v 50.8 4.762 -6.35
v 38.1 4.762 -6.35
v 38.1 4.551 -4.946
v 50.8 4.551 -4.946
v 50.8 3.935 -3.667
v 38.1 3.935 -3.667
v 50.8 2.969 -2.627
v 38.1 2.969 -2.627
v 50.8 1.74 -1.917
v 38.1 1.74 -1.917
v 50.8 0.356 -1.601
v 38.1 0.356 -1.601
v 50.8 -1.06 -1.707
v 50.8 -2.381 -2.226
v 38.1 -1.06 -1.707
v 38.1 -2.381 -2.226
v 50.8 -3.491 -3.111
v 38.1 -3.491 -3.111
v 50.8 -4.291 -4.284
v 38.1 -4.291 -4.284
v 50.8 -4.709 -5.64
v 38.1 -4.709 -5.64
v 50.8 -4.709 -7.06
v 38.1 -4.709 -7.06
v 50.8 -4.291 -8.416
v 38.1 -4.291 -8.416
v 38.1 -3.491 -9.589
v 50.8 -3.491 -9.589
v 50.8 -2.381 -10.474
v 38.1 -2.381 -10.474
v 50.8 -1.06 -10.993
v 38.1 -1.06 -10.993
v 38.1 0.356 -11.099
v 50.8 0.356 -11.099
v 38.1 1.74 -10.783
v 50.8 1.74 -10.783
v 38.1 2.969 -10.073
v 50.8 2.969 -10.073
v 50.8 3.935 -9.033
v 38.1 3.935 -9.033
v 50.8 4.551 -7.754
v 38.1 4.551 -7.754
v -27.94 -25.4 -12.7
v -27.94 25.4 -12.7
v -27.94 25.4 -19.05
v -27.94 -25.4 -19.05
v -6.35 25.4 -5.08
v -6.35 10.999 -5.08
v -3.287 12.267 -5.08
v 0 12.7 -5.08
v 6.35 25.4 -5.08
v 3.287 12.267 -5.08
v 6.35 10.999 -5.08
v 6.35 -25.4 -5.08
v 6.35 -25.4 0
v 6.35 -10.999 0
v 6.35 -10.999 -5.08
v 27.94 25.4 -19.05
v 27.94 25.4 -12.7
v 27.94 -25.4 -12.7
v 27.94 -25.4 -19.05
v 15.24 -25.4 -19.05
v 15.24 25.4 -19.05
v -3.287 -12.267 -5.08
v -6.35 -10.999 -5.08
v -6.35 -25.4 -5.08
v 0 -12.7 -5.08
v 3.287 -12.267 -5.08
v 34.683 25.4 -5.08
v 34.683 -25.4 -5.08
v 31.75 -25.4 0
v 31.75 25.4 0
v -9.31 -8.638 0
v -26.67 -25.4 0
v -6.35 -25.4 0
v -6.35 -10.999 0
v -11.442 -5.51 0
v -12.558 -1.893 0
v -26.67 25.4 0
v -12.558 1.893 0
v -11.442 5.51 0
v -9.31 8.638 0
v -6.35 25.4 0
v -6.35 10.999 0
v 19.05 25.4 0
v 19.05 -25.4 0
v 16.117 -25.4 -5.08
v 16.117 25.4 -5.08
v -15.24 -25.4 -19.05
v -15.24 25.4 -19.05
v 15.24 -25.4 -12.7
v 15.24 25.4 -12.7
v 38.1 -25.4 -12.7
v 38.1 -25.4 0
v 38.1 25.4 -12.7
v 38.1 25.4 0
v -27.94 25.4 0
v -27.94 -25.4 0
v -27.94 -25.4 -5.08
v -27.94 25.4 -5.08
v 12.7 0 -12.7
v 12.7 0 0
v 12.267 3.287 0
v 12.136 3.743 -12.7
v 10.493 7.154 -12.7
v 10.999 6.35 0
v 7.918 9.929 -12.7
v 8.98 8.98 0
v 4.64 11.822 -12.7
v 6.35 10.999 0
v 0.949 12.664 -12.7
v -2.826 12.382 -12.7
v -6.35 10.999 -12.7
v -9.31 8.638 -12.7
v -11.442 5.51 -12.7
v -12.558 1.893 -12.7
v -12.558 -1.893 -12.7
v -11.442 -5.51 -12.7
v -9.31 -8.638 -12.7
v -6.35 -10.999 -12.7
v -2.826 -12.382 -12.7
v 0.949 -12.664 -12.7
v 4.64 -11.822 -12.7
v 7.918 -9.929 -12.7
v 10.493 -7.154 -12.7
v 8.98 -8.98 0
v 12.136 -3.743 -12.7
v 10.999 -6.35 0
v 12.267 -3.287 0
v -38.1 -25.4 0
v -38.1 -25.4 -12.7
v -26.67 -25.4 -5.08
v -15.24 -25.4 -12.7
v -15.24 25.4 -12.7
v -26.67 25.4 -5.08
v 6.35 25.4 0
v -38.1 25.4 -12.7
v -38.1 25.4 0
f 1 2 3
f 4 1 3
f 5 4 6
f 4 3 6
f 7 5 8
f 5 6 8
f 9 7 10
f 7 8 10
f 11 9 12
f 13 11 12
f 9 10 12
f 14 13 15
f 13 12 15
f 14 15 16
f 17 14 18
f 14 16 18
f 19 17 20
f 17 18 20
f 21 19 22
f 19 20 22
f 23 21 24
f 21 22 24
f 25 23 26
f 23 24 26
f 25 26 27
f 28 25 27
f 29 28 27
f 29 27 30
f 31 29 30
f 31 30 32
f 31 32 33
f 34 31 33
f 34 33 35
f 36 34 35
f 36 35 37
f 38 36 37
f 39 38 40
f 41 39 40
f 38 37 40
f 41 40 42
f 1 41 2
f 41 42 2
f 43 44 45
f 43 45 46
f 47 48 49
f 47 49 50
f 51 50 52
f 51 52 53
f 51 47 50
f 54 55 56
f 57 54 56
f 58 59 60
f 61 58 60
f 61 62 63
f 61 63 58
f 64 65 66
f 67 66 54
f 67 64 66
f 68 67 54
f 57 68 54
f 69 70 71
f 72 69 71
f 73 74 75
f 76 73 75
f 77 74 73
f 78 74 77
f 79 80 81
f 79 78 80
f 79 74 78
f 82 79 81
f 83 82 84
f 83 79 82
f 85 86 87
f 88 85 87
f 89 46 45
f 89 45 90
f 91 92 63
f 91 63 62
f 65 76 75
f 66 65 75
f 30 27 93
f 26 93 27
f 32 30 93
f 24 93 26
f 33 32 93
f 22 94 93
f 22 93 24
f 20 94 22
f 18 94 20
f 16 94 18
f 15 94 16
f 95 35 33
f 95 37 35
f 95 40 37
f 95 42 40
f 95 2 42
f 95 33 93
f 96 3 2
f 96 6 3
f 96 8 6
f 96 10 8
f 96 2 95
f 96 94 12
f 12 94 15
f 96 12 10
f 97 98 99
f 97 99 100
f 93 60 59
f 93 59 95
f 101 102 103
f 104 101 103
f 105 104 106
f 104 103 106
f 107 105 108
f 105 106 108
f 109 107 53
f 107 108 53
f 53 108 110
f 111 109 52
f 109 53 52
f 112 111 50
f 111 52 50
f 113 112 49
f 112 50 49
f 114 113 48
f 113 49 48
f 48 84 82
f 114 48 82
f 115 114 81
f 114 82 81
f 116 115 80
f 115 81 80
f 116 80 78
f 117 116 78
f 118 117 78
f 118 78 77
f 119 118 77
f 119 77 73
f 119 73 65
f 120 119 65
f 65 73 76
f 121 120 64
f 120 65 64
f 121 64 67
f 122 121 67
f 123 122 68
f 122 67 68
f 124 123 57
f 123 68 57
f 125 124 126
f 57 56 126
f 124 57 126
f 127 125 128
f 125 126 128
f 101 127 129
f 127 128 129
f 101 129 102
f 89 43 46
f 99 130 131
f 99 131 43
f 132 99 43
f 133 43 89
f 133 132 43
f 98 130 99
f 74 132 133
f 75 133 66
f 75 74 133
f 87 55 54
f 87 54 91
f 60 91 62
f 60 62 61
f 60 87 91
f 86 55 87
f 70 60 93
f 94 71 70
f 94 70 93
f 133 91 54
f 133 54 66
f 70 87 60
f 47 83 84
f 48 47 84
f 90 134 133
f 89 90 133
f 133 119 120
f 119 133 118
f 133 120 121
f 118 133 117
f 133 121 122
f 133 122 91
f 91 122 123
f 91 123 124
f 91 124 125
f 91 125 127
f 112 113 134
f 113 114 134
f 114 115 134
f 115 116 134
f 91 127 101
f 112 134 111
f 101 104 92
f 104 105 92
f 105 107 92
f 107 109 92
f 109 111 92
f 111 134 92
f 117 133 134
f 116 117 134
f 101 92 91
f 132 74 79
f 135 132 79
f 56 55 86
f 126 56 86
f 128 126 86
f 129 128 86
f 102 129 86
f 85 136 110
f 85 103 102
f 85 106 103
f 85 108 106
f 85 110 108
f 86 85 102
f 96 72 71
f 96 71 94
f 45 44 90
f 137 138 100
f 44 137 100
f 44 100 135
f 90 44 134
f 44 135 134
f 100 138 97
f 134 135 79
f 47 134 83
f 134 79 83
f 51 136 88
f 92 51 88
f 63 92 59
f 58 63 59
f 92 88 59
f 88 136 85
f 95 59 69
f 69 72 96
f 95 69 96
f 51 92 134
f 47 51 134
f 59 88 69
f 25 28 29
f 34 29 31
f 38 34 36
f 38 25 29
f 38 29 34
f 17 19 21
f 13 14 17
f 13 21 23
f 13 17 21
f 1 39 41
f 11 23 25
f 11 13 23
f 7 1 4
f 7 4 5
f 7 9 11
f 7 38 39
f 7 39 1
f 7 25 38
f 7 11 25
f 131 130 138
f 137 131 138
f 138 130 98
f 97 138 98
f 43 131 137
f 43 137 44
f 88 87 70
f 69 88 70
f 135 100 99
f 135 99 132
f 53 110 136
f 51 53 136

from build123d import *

# Parameters (mm, degrees)
F0_W     = 76.2
F0_H     = 50.8
F0_R     = 12.7
F1_DEPTH = 12.7
F2_W     = 1.27
F2_H     = 50.8
F3_DEPTH = 5.08
F5_DEPTH = 50.801
F6_R     = 4.7625
F7_DEPTH = 12.7
F8_W     = 12.7
F8_H     = 50.8
F9_DEPTH = 6.35


with BuildPart() as f1:
    # F0 (on Top) → F1 (new body)
    with BuildSketch(Plane.XY):
        Rectangle(F0_W, F0_H)
        Circle(F0_R, mode=Mode.SUBTRACT)
    extrude(amount=-F1_DEPTH)

    # F2 (on face) → F3 (cut)
    with BuildSketch(Plane.XY):
        with Locations((-27.305, 0)):
            Rectangle(F2_W, F2_H)
        with BuildLine():
            Line((-6.35, -10.9985226281), (-6.35, -25.4))
            Line((-6.35, -25.4), (6.35, -25.4))
            Line((6.35, -25.4), (6.35, -10.9985226281))
            ThreePointArc((6.35, -10.9985226281), (0, -12.7), (-6.35, -10.9985226281))
        make_face()
        with BuildLine():
            Line((6.35, 25.4), (-6.35, 25.4))
            Line((-6.35, 25.4), (-6.35, 10.9985226281))
            ThreePointArc((-6.35, 10.9985226281), (0, 12.7), (6.35, 10.9985226281))
            Line((6.35, 10.9985226281), (6.35, 25.4))
        make_face()
    extrude(amount=-F3_DEPTH, mode=Mode.SUBTRACT)

    # F4 (on face) → F5 (cut, through all)
    with BuildSketch(Plane.XZ.offset(25.4)):
        Polygon((31.75, 0), (19.05, 0), (16.1170606325, -5.08), (34.6829393675, -5.08), align=None)
    extrude(amount=-F5_DEPTH, mode=Mode.SUBTRACT)

    # F6 (on face) → F7 (join)
    with BuildSketch(Plane.YZ.offset(38.1)):
        with Locations((0, -6.35)):
            Circle(F6_R)
    extrude(amount=F7_DEPTH)

    # F8 (on face) → F9 (join)
    with BuildSketch(Plane(origin=(0, 0, -12.7), x_dir=(1, 0, 0), z_dir=(0, 0, -1))):
        with Locations((-21.59, 0)):
            Rectangle(F8_W, F8_H)
        with Locations((21.59, 0)):
            Rectangle(F8_W, F8_H)
    extrude(amount=F9_DEPTH)


solid = f1.part
